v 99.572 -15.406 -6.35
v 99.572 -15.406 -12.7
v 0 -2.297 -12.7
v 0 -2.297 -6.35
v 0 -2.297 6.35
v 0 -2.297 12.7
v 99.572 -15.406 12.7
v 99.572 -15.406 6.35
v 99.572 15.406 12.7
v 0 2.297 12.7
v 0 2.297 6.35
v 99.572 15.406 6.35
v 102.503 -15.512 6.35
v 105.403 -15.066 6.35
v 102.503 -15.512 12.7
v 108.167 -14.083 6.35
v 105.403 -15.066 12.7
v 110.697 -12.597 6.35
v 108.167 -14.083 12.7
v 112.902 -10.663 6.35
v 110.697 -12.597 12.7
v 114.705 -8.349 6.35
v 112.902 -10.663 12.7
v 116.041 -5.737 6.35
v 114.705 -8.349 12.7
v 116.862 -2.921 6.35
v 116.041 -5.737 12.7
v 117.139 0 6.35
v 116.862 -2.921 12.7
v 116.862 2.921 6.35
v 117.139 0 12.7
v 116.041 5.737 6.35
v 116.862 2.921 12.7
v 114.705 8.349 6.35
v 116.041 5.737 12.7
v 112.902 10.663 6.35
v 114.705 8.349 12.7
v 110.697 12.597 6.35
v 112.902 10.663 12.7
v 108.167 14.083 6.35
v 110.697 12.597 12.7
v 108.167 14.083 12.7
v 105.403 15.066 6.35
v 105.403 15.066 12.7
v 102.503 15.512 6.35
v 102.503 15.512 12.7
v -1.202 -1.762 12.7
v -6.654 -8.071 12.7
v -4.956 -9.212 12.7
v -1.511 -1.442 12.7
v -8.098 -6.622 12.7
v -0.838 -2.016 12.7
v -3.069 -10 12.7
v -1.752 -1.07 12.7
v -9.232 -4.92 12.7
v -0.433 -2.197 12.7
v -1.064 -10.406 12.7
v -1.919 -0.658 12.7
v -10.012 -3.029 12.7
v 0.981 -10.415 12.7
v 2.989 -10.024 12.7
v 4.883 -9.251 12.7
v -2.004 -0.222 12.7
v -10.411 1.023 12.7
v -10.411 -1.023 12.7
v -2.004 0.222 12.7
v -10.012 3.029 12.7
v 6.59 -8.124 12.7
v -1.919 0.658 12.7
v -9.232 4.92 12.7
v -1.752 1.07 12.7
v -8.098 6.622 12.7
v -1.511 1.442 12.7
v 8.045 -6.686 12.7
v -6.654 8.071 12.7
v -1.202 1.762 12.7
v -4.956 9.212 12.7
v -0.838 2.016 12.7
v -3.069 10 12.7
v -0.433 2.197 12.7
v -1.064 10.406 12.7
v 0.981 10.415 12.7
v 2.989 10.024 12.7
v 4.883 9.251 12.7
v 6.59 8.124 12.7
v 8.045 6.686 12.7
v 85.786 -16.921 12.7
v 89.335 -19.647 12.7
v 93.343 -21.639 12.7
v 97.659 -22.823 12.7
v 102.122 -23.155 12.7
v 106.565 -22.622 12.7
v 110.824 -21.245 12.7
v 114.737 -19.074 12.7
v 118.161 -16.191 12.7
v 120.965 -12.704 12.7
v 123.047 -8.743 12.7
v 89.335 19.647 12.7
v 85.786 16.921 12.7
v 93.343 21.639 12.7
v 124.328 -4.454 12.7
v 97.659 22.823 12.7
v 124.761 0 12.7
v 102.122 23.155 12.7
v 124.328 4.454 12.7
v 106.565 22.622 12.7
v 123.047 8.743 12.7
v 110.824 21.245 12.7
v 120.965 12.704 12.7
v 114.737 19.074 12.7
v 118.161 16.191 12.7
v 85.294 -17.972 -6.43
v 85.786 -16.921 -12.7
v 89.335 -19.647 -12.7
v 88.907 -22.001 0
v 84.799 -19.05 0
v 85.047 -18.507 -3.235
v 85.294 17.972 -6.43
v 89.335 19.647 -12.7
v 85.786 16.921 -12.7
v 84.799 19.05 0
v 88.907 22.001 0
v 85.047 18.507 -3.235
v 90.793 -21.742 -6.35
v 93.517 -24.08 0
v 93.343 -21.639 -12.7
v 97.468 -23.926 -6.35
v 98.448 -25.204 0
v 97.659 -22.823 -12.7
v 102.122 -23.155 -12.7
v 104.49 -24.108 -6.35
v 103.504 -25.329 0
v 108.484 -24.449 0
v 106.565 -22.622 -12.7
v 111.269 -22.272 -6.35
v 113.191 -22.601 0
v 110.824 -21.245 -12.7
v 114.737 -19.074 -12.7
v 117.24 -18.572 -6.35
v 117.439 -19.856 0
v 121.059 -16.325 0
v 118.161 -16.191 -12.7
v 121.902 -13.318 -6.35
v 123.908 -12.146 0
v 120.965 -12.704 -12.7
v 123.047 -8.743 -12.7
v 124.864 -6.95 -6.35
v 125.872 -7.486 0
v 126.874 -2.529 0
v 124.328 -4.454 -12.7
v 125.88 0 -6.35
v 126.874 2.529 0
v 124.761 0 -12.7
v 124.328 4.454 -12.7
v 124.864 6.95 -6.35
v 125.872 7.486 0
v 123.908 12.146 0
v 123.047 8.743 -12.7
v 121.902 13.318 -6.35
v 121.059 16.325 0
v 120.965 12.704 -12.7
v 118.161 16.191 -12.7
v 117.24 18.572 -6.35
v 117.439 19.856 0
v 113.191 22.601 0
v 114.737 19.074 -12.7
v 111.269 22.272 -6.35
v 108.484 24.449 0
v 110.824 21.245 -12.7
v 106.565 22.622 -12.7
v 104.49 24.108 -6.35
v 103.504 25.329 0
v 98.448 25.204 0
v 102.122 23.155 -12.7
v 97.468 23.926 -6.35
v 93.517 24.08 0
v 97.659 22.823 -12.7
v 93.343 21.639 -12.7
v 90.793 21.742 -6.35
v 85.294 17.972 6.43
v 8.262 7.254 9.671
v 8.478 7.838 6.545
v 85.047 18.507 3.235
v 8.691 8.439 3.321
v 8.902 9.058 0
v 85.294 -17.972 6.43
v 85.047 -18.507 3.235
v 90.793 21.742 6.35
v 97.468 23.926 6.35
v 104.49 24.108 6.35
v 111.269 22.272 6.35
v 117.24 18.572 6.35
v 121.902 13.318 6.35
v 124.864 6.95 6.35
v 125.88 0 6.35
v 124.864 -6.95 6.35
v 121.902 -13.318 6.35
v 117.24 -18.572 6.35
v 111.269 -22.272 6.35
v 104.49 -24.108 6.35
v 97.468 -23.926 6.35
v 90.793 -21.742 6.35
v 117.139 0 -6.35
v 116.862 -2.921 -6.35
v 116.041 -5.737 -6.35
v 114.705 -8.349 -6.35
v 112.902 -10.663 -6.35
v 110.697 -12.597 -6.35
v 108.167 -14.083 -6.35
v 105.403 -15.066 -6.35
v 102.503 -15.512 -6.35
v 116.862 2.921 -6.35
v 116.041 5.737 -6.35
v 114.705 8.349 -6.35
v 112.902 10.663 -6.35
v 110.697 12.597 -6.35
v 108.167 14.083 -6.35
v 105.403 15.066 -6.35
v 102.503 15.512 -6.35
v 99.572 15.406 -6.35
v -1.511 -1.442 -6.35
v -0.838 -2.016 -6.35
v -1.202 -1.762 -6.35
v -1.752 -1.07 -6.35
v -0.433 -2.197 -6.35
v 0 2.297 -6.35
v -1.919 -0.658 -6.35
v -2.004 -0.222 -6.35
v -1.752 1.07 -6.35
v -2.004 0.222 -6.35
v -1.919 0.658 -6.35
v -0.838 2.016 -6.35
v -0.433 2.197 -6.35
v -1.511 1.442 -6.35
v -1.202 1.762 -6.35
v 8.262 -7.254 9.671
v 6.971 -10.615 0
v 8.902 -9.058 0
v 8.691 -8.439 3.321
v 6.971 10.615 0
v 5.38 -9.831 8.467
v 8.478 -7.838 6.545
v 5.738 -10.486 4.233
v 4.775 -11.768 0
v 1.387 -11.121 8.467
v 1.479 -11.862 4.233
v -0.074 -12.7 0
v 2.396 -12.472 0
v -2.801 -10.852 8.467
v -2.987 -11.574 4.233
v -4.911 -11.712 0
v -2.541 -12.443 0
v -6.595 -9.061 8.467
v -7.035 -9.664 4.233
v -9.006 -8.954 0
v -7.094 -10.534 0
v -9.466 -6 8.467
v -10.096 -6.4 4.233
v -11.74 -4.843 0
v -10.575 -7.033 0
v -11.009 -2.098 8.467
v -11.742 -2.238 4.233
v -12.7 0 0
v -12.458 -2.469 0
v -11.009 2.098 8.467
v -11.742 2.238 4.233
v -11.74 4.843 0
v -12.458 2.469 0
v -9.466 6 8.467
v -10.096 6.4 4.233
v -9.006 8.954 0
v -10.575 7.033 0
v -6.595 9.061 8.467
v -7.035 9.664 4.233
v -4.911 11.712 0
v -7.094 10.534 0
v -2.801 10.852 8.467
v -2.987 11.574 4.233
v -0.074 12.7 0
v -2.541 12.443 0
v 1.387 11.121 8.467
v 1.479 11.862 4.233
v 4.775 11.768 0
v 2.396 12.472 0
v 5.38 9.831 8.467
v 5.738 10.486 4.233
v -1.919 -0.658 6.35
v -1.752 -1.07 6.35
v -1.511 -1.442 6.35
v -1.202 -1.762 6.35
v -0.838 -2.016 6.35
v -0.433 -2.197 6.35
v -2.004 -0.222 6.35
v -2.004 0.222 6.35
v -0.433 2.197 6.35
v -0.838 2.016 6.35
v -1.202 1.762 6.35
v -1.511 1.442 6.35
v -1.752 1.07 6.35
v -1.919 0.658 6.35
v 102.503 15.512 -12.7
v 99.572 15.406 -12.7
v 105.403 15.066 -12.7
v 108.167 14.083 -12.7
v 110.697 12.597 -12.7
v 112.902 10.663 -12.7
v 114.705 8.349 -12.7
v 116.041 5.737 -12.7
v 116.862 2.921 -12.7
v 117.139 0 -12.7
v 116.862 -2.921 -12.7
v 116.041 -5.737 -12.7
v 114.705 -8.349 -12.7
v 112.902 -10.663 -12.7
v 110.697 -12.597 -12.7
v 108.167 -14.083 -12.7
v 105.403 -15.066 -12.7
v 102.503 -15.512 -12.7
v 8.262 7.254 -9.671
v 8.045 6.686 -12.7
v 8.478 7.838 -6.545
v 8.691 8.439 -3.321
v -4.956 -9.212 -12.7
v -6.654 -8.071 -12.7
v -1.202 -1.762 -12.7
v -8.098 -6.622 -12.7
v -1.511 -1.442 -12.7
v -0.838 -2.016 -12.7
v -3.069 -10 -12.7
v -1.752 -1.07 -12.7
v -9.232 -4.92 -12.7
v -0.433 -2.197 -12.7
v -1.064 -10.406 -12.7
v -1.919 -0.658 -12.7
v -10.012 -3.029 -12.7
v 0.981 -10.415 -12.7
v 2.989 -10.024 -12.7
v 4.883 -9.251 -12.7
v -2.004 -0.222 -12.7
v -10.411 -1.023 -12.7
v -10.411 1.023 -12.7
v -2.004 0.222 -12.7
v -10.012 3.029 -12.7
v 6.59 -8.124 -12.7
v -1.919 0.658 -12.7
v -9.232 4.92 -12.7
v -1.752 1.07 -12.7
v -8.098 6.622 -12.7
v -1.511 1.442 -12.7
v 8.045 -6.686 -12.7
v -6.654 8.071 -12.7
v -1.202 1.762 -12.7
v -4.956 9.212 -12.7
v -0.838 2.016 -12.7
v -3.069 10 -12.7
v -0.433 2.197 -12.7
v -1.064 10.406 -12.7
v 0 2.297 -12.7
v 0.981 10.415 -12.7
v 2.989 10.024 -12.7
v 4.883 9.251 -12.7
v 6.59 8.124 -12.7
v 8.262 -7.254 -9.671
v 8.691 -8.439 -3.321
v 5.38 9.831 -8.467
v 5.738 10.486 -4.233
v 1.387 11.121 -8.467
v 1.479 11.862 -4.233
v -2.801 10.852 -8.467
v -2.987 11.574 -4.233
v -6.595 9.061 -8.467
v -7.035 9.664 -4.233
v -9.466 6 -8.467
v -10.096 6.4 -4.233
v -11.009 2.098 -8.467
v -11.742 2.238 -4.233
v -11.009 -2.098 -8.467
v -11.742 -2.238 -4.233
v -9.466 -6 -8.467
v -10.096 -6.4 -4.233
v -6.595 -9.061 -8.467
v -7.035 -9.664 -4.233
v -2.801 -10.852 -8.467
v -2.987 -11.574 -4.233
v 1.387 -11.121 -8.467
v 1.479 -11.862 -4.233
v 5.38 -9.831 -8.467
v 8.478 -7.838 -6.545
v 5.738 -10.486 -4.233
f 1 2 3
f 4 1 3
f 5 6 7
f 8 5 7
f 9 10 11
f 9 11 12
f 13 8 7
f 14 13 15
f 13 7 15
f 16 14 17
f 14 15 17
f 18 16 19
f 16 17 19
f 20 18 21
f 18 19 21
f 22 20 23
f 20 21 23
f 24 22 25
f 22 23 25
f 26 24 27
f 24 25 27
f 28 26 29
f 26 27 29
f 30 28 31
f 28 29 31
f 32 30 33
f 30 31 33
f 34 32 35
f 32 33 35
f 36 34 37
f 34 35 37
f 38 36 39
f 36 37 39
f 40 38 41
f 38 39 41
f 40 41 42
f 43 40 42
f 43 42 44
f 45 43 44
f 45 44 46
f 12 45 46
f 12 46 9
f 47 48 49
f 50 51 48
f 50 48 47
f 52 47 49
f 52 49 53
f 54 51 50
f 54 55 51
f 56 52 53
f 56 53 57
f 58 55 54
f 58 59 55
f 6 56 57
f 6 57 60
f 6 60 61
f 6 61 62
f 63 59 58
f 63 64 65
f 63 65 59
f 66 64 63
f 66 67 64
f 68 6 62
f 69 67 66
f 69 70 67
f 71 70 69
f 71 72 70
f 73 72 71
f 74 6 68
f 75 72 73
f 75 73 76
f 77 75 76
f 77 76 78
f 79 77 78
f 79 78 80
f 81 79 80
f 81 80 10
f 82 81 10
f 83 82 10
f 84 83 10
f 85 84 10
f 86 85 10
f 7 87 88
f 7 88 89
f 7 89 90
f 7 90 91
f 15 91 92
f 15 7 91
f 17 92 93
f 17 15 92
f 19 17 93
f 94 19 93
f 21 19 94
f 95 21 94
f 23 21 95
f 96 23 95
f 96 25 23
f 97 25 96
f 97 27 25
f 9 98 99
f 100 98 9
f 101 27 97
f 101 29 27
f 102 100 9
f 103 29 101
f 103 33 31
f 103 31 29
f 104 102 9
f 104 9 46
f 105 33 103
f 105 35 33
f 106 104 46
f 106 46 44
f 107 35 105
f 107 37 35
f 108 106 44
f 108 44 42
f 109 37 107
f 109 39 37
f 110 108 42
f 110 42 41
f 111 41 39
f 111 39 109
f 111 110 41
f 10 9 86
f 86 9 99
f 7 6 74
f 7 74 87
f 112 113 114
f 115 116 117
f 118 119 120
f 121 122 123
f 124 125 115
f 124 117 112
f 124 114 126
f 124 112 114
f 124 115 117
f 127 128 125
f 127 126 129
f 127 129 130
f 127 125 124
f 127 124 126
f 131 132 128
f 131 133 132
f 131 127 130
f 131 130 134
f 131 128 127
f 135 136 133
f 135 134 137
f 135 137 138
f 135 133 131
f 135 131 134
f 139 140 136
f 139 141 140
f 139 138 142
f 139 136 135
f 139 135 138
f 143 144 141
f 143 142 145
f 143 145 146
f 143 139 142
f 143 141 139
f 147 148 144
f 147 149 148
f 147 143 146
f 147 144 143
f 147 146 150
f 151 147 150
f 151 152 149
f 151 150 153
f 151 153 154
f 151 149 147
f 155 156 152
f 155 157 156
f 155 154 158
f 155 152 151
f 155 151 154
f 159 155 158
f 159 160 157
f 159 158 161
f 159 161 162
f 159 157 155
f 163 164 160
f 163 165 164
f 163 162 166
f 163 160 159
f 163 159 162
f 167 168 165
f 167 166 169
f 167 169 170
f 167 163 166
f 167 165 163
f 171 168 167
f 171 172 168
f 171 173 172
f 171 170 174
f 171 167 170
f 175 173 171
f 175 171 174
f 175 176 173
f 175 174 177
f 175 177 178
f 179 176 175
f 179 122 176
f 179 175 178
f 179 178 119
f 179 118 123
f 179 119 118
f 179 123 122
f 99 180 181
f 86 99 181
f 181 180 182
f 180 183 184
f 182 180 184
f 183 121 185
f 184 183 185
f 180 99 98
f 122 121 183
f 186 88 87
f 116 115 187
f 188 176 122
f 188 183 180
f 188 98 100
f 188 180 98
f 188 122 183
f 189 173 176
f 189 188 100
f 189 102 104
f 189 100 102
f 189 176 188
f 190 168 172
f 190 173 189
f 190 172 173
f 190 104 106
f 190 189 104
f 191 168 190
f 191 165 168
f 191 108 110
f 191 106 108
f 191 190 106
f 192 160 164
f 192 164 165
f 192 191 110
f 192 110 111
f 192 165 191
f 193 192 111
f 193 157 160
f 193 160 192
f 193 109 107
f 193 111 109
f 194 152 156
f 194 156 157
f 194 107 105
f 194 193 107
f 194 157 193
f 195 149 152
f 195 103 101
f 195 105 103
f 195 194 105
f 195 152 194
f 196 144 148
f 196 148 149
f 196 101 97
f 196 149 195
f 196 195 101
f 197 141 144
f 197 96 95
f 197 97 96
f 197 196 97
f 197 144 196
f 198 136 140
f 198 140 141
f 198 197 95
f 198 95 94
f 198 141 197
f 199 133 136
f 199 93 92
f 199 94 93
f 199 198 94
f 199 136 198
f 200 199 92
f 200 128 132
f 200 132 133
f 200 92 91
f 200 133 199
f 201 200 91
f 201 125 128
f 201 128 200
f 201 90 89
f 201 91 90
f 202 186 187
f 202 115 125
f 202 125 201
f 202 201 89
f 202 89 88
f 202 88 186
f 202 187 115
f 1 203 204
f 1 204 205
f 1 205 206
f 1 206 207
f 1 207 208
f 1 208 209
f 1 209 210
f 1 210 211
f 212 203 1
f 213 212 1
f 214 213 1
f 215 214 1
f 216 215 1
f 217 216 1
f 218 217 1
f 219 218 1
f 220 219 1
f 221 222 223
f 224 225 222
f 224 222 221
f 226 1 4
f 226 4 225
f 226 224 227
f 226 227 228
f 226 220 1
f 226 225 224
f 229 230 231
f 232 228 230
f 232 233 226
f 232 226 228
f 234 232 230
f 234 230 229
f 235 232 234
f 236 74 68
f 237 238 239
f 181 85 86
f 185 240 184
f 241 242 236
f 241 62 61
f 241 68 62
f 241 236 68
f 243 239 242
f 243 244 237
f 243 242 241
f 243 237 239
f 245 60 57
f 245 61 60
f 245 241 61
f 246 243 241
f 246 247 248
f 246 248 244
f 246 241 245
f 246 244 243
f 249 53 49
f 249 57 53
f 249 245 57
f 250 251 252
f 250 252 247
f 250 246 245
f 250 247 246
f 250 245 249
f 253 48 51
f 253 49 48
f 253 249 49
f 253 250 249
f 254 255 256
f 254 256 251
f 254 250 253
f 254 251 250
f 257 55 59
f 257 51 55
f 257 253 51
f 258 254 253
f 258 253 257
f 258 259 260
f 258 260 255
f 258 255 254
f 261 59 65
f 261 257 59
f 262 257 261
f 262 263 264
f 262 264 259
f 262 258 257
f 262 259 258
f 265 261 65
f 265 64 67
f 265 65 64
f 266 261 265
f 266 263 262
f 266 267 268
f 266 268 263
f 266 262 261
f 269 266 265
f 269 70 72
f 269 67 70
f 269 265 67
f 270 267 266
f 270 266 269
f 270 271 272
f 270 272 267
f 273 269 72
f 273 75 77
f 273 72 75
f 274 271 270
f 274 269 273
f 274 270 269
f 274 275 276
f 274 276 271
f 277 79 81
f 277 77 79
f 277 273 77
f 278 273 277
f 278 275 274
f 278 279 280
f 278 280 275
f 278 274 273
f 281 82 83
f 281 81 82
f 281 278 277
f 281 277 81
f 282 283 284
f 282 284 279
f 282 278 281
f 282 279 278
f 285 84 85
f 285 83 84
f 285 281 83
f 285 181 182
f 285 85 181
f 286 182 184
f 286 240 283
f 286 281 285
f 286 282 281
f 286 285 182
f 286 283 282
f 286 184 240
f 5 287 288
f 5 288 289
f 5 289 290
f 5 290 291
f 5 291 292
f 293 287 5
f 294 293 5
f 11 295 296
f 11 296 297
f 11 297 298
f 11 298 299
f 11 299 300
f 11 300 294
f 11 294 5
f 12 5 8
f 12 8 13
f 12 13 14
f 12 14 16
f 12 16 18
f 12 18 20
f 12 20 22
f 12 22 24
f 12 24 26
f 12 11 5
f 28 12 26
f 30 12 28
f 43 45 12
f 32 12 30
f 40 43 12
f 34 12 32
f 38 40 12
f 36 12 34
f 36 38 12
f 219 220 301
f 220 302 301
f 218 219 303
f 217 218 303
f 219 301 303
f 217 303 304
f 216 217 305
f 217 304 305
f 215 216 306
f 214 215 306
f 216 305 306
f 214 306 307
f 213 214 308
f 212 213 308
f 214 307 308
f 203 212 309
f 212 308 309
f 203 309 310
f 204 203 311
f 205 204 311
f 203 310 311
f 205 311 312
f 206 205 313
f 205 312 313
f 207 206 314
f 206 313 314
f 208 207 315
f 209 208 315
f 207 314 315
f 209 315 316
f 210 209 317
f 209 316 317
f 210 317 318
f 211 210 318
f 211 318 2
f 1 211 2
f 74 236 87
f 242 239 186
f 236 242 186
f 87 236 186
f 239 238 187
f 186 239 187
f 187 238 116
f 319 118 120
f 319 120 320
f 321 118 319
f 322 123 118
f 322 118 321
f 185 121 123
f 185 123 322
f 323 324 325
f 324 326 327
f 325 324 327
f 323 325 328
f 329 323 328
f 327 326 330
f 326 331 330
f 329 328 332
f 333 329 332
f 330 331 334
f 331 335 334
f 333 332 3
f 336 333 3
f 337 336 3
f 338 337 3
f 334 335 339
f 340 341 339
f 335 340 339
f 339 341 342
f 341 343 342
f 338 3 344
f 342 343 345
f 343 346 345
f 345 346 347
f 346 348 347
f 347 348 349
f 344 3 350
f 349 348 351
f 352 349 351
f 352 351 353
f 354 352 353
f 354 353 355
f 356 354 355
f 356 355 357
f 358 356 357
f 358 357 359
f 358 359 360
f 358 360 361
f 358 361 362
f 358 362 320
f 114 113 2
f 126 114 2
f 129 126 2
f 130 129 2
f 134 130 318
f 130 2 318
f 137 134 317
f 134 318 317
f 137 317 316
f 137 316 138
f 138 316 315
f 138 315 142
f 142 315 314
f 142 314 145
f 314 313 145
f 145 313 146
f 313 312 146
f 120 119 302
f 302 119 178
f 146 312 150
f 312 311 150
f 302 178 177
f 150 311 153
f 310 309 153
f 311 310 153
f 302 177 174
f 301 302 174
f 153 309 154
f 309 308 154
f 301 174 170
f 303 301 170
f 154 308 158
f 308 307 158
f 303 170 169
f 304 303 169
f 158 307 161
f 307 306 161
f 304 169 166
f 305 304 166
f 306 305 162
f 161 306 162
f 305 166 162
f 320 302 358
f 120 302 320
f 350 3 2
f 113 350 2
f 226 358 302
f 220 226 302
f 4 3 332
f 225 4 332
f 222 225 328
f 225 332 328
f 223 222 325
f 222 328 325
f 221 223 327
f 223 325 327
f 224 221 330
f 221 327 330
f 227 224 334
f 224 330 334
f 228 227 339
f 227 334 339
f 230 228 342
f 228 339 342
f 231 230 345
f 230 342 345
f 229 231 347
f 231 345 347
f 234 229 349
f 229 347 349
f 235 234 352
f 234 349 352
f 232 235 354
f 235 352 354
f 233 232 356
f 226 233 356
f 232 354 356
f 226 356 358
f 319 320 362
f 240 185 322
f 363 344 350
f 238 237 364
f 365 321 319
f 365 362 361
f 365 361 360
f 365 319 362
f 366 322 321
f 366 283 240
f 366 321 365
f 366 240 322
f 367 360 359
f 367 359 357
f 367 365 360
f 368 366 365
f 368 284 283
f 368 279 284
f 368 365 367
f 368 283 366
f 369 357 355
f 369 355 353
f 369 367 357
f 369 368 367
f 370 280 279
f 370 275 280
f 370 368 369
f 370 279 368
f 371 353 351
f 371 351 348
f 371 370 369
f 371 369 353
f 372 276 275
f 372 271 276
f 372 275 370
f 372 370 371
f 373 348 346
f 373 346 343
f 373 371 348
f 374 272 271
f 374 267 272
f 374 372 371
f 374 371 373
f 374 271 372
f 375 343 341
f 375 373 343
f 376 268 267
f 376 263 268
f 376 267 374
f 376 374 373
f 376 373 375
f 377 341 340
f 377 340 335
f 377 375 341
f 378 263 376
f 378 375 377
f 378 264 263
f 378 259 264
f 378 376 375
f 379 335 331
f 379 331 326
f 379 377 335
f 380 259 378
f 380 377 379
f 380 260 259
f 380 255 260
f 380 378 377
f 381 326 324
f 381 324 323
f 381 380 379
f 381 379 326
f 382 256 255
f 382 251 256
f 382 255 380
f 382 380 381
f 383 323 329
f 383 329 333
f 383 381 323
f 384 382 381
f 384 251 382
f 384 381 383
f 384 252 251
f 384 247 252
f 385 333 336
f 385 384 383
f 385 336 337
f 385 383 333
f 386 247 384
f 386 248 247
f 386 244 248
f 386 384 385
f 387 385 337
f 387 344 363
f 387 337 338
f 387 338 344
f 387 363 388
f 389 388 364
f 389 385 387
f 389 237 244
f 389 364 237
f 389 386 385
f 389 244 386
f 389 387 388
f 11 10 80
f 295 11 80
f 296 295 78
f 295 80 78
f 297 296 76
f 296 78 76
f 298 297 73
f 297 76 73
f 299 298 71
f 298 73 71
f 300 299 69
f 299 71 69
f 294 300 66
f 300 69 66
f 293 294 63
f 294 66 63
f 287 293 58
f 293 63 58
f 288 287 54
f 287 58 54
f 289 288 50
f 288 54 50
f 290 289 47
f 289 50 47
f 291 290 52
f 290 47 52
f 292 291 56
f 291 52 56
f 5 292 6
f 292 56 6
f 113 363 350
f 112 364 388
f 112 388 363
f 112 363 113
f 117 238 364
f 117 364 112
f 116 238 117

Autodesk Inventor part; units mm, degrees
ref_plane "YZ Plane" through (0, 0, 0) normal (1, 0, 0) x (0, 1, 0)
ref_plane "XZ Plane" through (0, 0, 0) normal (0, 1, 0) x (-1, 0, 0)
ref_plane "XY Plane" through (0, 0, 0) normal (0, 0, 1) x (1, 0, 0)
sketch "Sketch1" plane through (0, 0, 0) normal (0, 0, 1) x (1, 0, 0)
  line L0 (-40.64, 0) -> (154.94, 0)
  line L1 (0, -35.56) -> (0, 35.56)
  arc A0 (8.901936, 9.057899) -> (8.901936, -9.057899) centre (0, 0) ccw
  arc A1 (84.799479, -19.05) -> (84.799479, 19.05) centre (101.6, 0) ccw
  line L2 (8.901936, 9.057899) -> (84.799479, 19.05)
  line L3 (8.901936, -9.057899) -> (84.799479, -19.05)
  dimension "d1" = 25.4
  dimension "d3" = 50.8
  dimension "d4" = 15
  dimension "d5" = 38.1
  dimension "d6" = 101.6
sketch "Sketch1 outline for Extrusion1" plane through (0, 0, 0) normal (0, 0, 1) x (1, 0, 0)
  arc A0 (8.901936, 9.057899) -> (8.901936, -9.057899) centre (0, 0) ccw
  line L0 (84.799479, 19.05) -> (8.901936, 9.057899)
  arc A1 (84.799479, -19.05) -> (84.799479, 19.05) centre (101.6, 0) ccw
  line L1 (8.901936, -9.057899) -> (84.799479, -19.05)
extrude "Extrusion1" add sketch "Sketch1 outline for Extrusion1" along normal mid plane 25.4 draft -10
sketch "Sketch2" plane through (0, 0, 12.7) normal (0, 0, 1) x (1, 0, 0)
  line L0 (0, 2.296768) -> (99.571808, 15.405645)
  line L1 (8.044726, 6.686369) -> (85.785782, 16.921173)
  line L2 (0, -35.56) -> (0, 35.56)
  line L3 (-40.64, 0) -> (154.94, 0)
  line L4 (0, -2.296768) -> (99.571808, -15.405645)
  arc A0 (0, 2.296768) -> (0, -2.296768) centre (0.302375, 0) ccw
  arc A1 (99.571808, -15.405645) -> (99.571808, 15.405645) centre (101.6, 0) ccw
  arc A2 (85.785782, -16.921173) -> (85.785782, 16.921173) centre (101.6, 0) ccw
  point P0 (0, 0)
  point P1 (8.355059, 3.396732)
  point P2 (8.355059, -3.396732)
  dimension "d10" = 3.302
extrude "Extrusion2" cut sketch "Sketch2" against normal blind 6.35
sketch "Sketch3" plane through (0, 0, -12.7) normal (0, 0, -1) x (-1, 0, 0)
  arc A0 (0, -2.296768) -> (0, 2.296768) centre (-0.302375, 0) ccw
  arc A1 (0, -2.296768) -> (0, 2.296768) centre (-0.302375, 0) ccw
  line L0 (-99.571808, -15.405645) -> (0, -2.296768)
  line L1 (0, 2.296768) -> (-99.571808, 15.405645)
  arc A2 (-99.571808, 15.405645) -> (-99.571808, -15.405645) centre (-101.6, 0) ccw
  arc A3 (-99.571808, 15.405645) -> (-99.571808, -15.405645) centre (-101.6, 0) ccw
  line L2 (0, -2.296768) -> (-99.571808, -15.405645)
  line L3 (-85.785782, 16.921173) -> (-8.044726, 6.686369)
  point P0 (0, 0)
  point P1 (0, 2.296768)
extrude "Extrusion3" cut sketch "Sketch3" against normal blind 6.35
properties part number "Ch3 Part 2"
